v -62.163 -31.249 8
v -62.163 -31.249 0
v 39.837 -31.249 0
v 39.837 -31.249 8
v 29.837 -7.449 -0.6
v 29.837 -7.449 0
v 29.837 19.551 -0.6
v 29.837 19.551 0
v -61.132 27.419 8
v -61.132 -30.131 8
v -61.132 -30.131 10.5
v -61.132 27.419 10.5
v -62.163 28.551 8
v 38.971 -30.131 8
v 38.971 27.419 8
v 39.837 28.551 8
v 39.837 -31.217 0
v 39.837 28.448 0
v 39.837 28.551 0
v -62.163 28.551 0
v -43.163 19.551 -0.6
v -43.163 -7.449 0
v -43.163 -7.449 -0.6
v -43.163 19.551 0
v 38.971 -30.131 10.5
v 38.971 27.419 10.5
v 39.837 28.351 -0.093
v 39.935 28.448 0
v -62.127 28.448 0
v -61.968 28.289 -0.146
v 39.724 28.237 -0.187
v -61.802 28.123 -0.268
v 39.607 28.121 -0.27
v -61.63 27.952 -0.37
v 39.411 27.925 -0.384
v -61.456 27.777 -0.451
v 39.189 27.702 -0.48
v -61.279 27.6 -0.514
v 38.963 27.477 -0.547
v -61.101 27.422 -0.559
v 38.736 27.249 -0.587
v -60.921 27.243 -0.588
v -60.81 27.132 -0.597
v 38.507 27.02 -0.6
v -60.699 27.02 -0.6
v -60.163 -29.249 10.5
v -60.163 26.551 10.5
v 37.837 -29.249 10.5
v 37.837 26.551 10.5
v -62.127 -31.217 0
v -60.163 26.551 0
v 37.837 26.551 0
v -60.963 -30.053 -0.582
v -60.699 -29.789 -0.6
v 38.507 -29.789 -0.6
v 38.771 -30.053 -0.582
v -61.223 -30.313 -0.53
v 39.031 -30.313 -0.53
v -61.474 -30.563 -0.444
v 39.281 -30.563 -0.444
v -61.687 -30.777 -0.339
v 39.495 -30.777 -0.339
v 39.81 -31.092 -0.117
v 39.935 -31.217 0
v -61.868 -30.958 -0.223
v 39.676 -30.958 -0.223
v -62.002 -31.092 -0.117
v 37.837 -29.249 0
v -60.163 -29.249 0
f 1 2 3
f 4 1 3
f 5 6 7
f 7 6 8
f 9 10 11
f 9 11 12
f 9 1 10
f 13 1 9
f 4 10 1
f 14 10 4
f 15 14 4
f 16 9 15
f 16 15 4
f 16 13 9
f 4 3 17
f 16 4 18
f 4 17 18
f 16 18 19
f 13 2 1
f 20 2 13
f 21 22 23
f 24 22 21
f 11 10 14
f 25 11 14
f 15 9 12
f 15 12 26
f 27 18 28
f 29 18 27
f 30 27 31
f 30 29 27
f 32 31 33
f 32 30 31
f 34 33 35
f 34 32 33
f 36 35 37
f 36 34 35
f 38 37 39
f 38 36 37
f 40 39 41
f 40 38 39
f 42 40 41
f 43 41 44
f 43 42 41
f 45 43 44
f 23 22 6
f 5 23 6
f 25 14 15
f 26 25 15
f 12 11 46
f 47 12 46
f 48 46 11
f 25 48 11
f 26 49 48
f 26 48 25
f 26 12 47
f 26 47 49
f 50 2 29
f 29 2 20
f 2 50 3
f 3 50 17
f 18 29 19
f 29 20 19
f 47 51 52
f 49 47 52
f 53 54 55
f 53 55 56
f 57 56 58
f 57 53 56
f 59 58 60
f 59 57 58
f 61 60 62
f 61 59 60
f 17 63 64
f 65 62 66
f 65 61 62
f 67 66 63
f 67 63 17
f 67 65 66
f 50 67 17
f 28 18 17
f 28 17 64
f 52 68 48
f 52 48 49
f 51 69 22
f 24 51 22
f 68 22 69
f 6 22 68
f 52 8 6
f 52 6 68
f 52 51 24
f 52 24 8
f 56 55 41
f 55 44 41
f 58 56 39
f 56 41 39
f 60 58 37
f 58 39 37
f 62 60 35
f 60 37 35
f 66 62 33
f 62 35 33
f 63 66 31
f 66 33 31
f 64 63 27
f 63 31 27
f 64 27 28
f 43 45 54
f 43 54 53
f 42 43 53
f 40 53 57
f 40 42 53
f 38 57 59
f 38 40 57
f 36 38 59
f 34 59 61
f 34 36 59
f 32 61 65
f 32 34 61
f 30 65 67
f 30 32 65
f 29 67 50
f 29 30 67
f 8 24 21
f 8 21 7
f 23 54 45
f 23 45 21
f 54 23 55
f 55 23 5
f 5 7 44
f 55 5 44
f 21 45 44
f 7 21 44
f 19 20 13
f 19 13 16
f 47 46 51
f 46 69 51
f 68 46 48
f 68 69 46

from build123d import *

# Parameters (mm, degrees)
F0_W        = 102
F0_H        = 59.8
F0_W_2      = 98
F0_H_2      = 55.8
F1_DEPTH    = 8
F2_W        = 102.0620055497
F2_H        = 59.6651937813
F3_DEPTH    = 0.6
F4_W        = 100.1025550067
F4_H        = 57.5502440333
F4_W_2      = 98
F4_H_2      = 55.8
F5_DEPTH    = 2.5
F6_T1_DEPTH = 105.5349790349
F6_T3_DEPTH = 3.6684549434
F6_T5_DEPTH = 66.8066222098
F6_T7_DEPTH = 3.6684549117
F6_T9_DEPTH = 105.5349790665
F7_W        = 73
F7_H        = 27
F8_DEPTH    = 8.6010001


# Not quite as in the source:
# - a fillet or chamfer that OpenCascade refuses, or shapes differently, is made with other operations: its cross-section is extruded or revolved along the edge and cut away or added


with BuildPart() as f1:
    # F0 (on Top) → F1 (new body)
    with BuildSketch(Plane.XY):
        with Locations((-11.1629452705, -1.3489569187)):
            Rectangle(F0_W, F0_H)
        with Locations((-11.1629452705, -1.3489569187)):
            Rectangle(F0_W_2, F0_H_2, mode=Mode.SUBTRACT)
    extrude(amount=F1_DEPTH)

    # F2 (on Top) → F3 (join)
    with BuildSketch(Plane.XY):
        with Locations((-11.096207425, -1.3842275366)):
            Rectangle(F2_W, F2_H)
    extrude(amount=-F3_DEPTH)

    # F4 (on face) → F5 (join)
    with BuildSketch(Plane.XY.offset(8)):
        with Locations((-11.0803488642, -1.3563353568)):
            Rectangle(F4_W, F4_H)
        with Locations((-11.1629452705, -1.3489569187)):
            Rectangle(F4_W_2, F4_H_2, mode=Mode.SUBTRACT)
    extrude(amount=F5_DEPTH)

    # F6: fillet of radius 2 on 4 edges, made by hand

    # F6_s2 → F6_t1 (cut)
    with BuildSketch(Plane.YZ.offset(-65.6979244141)):
        with BuildLine():
            ThreePointArc((-29.7885387415, -0.6), (-30.5631354108, -0.4439088915), (-31.2168244272, 0))
            Line((-31.2168244272, 0), (-31.2168244272, -0.6))
            Line((-31.2168244272, -0.6), (-29.7885387415, -0.6))
        make_face()
    extrude(amount=F6_T1_DEPTH, mode=Mode.SUBTRACT)

    # F6_s4 → F6_t3 (cut)
    with BuildSketch(Plane.YZ.offset(39.8370546207)):
        with BuildLine():
            ThreePointArc((-29.7885387415, -0.6), (-30.5631354108, -0.4439088915), (-31.2168244272, 0))
            Line((-31.2168244272, 0), (-31.2168244272, -0.6))
            Line((-31.2168244272, -0.6), (-29.7885387415, -0.6))
        make_face()
    extrude(amount=F6_T3_DEPTH, mode=Mode.SUBTRACT)

    # F6_s6 → F6_t5 (cut)
    with BuildSketch(Plane.XZ.offset(-32.0190835683)):
        with BuildLine():
            ThreePointArc((-60.6989245141, -0.6), (-61.4735211834, -0.4439088915), (-62.1272101998, 0))
            Line((-62.1272101998, 0), (-62.1272101998, -0.6))
            Line((-62.1272101998, -0.6), (-60.6989245141, -0.6))
        make_face()
        with BuildLine():
            ThreePointArc((38.5065096641, -0.6), (39.2811063334, -0.4439088915), (39.9347953498, 0))
            Line((39.9347953498, 0), (39.9347953498, -0.6))
            Line((39.9347953498, -0.6), (38.5065096641, -0.6))
        make_face()
    extrude(amount=F6_T5_DEPTH, mode=Mode.SUBTRACT)

    # F6_s8 → F6_t7 (cut)
    with BuildSketch(Plane.YZ.offset(39.8370546524)):
        with BuildLine():
            ThreePointArc((28.448369354, 0), (27.7946803375, -0.4439088915), (27.0200836683, -0.6))
            Line((27.0200836683, -0.6), (28.448369354, -0.6))
            Line((28.448369354, -0.6), (28.448369354, 0))
        make_face()
    extrude(amount=F6_T7_DEPTH, mode=Mode.SUBTRACT)

    # F6_s10 → F6_t9 (cut)
    with BuildSketch(Plane.YZ.offset(-65.6979244141)):
        with BuildLine():
            ThreePointArc((28.448369354, 0), (27.7946803375, -0.4439088915), (27.0200836683, -0.6))
            Line((27.0200836683, -0.6), (28.448369354, -0.6))
            Line((28.448369354, -0.6), (28.448369354, 0))
        make_face()
    extrude(amount=F6_T9_DEPTH, mode=Mode.SUBTRACT)

    # F7 (on face) → F8 (cut, through all)
    with BuildSketch(Plane.XY.offset(8)):
        with Locations((-6.6629452705, 6.0510430813)):
            Rectangle(F7_W, F7_H)
    extrude(amount=-F8_DEPTH, mode=Mode.SUBTRACT)


solid = f1.part
